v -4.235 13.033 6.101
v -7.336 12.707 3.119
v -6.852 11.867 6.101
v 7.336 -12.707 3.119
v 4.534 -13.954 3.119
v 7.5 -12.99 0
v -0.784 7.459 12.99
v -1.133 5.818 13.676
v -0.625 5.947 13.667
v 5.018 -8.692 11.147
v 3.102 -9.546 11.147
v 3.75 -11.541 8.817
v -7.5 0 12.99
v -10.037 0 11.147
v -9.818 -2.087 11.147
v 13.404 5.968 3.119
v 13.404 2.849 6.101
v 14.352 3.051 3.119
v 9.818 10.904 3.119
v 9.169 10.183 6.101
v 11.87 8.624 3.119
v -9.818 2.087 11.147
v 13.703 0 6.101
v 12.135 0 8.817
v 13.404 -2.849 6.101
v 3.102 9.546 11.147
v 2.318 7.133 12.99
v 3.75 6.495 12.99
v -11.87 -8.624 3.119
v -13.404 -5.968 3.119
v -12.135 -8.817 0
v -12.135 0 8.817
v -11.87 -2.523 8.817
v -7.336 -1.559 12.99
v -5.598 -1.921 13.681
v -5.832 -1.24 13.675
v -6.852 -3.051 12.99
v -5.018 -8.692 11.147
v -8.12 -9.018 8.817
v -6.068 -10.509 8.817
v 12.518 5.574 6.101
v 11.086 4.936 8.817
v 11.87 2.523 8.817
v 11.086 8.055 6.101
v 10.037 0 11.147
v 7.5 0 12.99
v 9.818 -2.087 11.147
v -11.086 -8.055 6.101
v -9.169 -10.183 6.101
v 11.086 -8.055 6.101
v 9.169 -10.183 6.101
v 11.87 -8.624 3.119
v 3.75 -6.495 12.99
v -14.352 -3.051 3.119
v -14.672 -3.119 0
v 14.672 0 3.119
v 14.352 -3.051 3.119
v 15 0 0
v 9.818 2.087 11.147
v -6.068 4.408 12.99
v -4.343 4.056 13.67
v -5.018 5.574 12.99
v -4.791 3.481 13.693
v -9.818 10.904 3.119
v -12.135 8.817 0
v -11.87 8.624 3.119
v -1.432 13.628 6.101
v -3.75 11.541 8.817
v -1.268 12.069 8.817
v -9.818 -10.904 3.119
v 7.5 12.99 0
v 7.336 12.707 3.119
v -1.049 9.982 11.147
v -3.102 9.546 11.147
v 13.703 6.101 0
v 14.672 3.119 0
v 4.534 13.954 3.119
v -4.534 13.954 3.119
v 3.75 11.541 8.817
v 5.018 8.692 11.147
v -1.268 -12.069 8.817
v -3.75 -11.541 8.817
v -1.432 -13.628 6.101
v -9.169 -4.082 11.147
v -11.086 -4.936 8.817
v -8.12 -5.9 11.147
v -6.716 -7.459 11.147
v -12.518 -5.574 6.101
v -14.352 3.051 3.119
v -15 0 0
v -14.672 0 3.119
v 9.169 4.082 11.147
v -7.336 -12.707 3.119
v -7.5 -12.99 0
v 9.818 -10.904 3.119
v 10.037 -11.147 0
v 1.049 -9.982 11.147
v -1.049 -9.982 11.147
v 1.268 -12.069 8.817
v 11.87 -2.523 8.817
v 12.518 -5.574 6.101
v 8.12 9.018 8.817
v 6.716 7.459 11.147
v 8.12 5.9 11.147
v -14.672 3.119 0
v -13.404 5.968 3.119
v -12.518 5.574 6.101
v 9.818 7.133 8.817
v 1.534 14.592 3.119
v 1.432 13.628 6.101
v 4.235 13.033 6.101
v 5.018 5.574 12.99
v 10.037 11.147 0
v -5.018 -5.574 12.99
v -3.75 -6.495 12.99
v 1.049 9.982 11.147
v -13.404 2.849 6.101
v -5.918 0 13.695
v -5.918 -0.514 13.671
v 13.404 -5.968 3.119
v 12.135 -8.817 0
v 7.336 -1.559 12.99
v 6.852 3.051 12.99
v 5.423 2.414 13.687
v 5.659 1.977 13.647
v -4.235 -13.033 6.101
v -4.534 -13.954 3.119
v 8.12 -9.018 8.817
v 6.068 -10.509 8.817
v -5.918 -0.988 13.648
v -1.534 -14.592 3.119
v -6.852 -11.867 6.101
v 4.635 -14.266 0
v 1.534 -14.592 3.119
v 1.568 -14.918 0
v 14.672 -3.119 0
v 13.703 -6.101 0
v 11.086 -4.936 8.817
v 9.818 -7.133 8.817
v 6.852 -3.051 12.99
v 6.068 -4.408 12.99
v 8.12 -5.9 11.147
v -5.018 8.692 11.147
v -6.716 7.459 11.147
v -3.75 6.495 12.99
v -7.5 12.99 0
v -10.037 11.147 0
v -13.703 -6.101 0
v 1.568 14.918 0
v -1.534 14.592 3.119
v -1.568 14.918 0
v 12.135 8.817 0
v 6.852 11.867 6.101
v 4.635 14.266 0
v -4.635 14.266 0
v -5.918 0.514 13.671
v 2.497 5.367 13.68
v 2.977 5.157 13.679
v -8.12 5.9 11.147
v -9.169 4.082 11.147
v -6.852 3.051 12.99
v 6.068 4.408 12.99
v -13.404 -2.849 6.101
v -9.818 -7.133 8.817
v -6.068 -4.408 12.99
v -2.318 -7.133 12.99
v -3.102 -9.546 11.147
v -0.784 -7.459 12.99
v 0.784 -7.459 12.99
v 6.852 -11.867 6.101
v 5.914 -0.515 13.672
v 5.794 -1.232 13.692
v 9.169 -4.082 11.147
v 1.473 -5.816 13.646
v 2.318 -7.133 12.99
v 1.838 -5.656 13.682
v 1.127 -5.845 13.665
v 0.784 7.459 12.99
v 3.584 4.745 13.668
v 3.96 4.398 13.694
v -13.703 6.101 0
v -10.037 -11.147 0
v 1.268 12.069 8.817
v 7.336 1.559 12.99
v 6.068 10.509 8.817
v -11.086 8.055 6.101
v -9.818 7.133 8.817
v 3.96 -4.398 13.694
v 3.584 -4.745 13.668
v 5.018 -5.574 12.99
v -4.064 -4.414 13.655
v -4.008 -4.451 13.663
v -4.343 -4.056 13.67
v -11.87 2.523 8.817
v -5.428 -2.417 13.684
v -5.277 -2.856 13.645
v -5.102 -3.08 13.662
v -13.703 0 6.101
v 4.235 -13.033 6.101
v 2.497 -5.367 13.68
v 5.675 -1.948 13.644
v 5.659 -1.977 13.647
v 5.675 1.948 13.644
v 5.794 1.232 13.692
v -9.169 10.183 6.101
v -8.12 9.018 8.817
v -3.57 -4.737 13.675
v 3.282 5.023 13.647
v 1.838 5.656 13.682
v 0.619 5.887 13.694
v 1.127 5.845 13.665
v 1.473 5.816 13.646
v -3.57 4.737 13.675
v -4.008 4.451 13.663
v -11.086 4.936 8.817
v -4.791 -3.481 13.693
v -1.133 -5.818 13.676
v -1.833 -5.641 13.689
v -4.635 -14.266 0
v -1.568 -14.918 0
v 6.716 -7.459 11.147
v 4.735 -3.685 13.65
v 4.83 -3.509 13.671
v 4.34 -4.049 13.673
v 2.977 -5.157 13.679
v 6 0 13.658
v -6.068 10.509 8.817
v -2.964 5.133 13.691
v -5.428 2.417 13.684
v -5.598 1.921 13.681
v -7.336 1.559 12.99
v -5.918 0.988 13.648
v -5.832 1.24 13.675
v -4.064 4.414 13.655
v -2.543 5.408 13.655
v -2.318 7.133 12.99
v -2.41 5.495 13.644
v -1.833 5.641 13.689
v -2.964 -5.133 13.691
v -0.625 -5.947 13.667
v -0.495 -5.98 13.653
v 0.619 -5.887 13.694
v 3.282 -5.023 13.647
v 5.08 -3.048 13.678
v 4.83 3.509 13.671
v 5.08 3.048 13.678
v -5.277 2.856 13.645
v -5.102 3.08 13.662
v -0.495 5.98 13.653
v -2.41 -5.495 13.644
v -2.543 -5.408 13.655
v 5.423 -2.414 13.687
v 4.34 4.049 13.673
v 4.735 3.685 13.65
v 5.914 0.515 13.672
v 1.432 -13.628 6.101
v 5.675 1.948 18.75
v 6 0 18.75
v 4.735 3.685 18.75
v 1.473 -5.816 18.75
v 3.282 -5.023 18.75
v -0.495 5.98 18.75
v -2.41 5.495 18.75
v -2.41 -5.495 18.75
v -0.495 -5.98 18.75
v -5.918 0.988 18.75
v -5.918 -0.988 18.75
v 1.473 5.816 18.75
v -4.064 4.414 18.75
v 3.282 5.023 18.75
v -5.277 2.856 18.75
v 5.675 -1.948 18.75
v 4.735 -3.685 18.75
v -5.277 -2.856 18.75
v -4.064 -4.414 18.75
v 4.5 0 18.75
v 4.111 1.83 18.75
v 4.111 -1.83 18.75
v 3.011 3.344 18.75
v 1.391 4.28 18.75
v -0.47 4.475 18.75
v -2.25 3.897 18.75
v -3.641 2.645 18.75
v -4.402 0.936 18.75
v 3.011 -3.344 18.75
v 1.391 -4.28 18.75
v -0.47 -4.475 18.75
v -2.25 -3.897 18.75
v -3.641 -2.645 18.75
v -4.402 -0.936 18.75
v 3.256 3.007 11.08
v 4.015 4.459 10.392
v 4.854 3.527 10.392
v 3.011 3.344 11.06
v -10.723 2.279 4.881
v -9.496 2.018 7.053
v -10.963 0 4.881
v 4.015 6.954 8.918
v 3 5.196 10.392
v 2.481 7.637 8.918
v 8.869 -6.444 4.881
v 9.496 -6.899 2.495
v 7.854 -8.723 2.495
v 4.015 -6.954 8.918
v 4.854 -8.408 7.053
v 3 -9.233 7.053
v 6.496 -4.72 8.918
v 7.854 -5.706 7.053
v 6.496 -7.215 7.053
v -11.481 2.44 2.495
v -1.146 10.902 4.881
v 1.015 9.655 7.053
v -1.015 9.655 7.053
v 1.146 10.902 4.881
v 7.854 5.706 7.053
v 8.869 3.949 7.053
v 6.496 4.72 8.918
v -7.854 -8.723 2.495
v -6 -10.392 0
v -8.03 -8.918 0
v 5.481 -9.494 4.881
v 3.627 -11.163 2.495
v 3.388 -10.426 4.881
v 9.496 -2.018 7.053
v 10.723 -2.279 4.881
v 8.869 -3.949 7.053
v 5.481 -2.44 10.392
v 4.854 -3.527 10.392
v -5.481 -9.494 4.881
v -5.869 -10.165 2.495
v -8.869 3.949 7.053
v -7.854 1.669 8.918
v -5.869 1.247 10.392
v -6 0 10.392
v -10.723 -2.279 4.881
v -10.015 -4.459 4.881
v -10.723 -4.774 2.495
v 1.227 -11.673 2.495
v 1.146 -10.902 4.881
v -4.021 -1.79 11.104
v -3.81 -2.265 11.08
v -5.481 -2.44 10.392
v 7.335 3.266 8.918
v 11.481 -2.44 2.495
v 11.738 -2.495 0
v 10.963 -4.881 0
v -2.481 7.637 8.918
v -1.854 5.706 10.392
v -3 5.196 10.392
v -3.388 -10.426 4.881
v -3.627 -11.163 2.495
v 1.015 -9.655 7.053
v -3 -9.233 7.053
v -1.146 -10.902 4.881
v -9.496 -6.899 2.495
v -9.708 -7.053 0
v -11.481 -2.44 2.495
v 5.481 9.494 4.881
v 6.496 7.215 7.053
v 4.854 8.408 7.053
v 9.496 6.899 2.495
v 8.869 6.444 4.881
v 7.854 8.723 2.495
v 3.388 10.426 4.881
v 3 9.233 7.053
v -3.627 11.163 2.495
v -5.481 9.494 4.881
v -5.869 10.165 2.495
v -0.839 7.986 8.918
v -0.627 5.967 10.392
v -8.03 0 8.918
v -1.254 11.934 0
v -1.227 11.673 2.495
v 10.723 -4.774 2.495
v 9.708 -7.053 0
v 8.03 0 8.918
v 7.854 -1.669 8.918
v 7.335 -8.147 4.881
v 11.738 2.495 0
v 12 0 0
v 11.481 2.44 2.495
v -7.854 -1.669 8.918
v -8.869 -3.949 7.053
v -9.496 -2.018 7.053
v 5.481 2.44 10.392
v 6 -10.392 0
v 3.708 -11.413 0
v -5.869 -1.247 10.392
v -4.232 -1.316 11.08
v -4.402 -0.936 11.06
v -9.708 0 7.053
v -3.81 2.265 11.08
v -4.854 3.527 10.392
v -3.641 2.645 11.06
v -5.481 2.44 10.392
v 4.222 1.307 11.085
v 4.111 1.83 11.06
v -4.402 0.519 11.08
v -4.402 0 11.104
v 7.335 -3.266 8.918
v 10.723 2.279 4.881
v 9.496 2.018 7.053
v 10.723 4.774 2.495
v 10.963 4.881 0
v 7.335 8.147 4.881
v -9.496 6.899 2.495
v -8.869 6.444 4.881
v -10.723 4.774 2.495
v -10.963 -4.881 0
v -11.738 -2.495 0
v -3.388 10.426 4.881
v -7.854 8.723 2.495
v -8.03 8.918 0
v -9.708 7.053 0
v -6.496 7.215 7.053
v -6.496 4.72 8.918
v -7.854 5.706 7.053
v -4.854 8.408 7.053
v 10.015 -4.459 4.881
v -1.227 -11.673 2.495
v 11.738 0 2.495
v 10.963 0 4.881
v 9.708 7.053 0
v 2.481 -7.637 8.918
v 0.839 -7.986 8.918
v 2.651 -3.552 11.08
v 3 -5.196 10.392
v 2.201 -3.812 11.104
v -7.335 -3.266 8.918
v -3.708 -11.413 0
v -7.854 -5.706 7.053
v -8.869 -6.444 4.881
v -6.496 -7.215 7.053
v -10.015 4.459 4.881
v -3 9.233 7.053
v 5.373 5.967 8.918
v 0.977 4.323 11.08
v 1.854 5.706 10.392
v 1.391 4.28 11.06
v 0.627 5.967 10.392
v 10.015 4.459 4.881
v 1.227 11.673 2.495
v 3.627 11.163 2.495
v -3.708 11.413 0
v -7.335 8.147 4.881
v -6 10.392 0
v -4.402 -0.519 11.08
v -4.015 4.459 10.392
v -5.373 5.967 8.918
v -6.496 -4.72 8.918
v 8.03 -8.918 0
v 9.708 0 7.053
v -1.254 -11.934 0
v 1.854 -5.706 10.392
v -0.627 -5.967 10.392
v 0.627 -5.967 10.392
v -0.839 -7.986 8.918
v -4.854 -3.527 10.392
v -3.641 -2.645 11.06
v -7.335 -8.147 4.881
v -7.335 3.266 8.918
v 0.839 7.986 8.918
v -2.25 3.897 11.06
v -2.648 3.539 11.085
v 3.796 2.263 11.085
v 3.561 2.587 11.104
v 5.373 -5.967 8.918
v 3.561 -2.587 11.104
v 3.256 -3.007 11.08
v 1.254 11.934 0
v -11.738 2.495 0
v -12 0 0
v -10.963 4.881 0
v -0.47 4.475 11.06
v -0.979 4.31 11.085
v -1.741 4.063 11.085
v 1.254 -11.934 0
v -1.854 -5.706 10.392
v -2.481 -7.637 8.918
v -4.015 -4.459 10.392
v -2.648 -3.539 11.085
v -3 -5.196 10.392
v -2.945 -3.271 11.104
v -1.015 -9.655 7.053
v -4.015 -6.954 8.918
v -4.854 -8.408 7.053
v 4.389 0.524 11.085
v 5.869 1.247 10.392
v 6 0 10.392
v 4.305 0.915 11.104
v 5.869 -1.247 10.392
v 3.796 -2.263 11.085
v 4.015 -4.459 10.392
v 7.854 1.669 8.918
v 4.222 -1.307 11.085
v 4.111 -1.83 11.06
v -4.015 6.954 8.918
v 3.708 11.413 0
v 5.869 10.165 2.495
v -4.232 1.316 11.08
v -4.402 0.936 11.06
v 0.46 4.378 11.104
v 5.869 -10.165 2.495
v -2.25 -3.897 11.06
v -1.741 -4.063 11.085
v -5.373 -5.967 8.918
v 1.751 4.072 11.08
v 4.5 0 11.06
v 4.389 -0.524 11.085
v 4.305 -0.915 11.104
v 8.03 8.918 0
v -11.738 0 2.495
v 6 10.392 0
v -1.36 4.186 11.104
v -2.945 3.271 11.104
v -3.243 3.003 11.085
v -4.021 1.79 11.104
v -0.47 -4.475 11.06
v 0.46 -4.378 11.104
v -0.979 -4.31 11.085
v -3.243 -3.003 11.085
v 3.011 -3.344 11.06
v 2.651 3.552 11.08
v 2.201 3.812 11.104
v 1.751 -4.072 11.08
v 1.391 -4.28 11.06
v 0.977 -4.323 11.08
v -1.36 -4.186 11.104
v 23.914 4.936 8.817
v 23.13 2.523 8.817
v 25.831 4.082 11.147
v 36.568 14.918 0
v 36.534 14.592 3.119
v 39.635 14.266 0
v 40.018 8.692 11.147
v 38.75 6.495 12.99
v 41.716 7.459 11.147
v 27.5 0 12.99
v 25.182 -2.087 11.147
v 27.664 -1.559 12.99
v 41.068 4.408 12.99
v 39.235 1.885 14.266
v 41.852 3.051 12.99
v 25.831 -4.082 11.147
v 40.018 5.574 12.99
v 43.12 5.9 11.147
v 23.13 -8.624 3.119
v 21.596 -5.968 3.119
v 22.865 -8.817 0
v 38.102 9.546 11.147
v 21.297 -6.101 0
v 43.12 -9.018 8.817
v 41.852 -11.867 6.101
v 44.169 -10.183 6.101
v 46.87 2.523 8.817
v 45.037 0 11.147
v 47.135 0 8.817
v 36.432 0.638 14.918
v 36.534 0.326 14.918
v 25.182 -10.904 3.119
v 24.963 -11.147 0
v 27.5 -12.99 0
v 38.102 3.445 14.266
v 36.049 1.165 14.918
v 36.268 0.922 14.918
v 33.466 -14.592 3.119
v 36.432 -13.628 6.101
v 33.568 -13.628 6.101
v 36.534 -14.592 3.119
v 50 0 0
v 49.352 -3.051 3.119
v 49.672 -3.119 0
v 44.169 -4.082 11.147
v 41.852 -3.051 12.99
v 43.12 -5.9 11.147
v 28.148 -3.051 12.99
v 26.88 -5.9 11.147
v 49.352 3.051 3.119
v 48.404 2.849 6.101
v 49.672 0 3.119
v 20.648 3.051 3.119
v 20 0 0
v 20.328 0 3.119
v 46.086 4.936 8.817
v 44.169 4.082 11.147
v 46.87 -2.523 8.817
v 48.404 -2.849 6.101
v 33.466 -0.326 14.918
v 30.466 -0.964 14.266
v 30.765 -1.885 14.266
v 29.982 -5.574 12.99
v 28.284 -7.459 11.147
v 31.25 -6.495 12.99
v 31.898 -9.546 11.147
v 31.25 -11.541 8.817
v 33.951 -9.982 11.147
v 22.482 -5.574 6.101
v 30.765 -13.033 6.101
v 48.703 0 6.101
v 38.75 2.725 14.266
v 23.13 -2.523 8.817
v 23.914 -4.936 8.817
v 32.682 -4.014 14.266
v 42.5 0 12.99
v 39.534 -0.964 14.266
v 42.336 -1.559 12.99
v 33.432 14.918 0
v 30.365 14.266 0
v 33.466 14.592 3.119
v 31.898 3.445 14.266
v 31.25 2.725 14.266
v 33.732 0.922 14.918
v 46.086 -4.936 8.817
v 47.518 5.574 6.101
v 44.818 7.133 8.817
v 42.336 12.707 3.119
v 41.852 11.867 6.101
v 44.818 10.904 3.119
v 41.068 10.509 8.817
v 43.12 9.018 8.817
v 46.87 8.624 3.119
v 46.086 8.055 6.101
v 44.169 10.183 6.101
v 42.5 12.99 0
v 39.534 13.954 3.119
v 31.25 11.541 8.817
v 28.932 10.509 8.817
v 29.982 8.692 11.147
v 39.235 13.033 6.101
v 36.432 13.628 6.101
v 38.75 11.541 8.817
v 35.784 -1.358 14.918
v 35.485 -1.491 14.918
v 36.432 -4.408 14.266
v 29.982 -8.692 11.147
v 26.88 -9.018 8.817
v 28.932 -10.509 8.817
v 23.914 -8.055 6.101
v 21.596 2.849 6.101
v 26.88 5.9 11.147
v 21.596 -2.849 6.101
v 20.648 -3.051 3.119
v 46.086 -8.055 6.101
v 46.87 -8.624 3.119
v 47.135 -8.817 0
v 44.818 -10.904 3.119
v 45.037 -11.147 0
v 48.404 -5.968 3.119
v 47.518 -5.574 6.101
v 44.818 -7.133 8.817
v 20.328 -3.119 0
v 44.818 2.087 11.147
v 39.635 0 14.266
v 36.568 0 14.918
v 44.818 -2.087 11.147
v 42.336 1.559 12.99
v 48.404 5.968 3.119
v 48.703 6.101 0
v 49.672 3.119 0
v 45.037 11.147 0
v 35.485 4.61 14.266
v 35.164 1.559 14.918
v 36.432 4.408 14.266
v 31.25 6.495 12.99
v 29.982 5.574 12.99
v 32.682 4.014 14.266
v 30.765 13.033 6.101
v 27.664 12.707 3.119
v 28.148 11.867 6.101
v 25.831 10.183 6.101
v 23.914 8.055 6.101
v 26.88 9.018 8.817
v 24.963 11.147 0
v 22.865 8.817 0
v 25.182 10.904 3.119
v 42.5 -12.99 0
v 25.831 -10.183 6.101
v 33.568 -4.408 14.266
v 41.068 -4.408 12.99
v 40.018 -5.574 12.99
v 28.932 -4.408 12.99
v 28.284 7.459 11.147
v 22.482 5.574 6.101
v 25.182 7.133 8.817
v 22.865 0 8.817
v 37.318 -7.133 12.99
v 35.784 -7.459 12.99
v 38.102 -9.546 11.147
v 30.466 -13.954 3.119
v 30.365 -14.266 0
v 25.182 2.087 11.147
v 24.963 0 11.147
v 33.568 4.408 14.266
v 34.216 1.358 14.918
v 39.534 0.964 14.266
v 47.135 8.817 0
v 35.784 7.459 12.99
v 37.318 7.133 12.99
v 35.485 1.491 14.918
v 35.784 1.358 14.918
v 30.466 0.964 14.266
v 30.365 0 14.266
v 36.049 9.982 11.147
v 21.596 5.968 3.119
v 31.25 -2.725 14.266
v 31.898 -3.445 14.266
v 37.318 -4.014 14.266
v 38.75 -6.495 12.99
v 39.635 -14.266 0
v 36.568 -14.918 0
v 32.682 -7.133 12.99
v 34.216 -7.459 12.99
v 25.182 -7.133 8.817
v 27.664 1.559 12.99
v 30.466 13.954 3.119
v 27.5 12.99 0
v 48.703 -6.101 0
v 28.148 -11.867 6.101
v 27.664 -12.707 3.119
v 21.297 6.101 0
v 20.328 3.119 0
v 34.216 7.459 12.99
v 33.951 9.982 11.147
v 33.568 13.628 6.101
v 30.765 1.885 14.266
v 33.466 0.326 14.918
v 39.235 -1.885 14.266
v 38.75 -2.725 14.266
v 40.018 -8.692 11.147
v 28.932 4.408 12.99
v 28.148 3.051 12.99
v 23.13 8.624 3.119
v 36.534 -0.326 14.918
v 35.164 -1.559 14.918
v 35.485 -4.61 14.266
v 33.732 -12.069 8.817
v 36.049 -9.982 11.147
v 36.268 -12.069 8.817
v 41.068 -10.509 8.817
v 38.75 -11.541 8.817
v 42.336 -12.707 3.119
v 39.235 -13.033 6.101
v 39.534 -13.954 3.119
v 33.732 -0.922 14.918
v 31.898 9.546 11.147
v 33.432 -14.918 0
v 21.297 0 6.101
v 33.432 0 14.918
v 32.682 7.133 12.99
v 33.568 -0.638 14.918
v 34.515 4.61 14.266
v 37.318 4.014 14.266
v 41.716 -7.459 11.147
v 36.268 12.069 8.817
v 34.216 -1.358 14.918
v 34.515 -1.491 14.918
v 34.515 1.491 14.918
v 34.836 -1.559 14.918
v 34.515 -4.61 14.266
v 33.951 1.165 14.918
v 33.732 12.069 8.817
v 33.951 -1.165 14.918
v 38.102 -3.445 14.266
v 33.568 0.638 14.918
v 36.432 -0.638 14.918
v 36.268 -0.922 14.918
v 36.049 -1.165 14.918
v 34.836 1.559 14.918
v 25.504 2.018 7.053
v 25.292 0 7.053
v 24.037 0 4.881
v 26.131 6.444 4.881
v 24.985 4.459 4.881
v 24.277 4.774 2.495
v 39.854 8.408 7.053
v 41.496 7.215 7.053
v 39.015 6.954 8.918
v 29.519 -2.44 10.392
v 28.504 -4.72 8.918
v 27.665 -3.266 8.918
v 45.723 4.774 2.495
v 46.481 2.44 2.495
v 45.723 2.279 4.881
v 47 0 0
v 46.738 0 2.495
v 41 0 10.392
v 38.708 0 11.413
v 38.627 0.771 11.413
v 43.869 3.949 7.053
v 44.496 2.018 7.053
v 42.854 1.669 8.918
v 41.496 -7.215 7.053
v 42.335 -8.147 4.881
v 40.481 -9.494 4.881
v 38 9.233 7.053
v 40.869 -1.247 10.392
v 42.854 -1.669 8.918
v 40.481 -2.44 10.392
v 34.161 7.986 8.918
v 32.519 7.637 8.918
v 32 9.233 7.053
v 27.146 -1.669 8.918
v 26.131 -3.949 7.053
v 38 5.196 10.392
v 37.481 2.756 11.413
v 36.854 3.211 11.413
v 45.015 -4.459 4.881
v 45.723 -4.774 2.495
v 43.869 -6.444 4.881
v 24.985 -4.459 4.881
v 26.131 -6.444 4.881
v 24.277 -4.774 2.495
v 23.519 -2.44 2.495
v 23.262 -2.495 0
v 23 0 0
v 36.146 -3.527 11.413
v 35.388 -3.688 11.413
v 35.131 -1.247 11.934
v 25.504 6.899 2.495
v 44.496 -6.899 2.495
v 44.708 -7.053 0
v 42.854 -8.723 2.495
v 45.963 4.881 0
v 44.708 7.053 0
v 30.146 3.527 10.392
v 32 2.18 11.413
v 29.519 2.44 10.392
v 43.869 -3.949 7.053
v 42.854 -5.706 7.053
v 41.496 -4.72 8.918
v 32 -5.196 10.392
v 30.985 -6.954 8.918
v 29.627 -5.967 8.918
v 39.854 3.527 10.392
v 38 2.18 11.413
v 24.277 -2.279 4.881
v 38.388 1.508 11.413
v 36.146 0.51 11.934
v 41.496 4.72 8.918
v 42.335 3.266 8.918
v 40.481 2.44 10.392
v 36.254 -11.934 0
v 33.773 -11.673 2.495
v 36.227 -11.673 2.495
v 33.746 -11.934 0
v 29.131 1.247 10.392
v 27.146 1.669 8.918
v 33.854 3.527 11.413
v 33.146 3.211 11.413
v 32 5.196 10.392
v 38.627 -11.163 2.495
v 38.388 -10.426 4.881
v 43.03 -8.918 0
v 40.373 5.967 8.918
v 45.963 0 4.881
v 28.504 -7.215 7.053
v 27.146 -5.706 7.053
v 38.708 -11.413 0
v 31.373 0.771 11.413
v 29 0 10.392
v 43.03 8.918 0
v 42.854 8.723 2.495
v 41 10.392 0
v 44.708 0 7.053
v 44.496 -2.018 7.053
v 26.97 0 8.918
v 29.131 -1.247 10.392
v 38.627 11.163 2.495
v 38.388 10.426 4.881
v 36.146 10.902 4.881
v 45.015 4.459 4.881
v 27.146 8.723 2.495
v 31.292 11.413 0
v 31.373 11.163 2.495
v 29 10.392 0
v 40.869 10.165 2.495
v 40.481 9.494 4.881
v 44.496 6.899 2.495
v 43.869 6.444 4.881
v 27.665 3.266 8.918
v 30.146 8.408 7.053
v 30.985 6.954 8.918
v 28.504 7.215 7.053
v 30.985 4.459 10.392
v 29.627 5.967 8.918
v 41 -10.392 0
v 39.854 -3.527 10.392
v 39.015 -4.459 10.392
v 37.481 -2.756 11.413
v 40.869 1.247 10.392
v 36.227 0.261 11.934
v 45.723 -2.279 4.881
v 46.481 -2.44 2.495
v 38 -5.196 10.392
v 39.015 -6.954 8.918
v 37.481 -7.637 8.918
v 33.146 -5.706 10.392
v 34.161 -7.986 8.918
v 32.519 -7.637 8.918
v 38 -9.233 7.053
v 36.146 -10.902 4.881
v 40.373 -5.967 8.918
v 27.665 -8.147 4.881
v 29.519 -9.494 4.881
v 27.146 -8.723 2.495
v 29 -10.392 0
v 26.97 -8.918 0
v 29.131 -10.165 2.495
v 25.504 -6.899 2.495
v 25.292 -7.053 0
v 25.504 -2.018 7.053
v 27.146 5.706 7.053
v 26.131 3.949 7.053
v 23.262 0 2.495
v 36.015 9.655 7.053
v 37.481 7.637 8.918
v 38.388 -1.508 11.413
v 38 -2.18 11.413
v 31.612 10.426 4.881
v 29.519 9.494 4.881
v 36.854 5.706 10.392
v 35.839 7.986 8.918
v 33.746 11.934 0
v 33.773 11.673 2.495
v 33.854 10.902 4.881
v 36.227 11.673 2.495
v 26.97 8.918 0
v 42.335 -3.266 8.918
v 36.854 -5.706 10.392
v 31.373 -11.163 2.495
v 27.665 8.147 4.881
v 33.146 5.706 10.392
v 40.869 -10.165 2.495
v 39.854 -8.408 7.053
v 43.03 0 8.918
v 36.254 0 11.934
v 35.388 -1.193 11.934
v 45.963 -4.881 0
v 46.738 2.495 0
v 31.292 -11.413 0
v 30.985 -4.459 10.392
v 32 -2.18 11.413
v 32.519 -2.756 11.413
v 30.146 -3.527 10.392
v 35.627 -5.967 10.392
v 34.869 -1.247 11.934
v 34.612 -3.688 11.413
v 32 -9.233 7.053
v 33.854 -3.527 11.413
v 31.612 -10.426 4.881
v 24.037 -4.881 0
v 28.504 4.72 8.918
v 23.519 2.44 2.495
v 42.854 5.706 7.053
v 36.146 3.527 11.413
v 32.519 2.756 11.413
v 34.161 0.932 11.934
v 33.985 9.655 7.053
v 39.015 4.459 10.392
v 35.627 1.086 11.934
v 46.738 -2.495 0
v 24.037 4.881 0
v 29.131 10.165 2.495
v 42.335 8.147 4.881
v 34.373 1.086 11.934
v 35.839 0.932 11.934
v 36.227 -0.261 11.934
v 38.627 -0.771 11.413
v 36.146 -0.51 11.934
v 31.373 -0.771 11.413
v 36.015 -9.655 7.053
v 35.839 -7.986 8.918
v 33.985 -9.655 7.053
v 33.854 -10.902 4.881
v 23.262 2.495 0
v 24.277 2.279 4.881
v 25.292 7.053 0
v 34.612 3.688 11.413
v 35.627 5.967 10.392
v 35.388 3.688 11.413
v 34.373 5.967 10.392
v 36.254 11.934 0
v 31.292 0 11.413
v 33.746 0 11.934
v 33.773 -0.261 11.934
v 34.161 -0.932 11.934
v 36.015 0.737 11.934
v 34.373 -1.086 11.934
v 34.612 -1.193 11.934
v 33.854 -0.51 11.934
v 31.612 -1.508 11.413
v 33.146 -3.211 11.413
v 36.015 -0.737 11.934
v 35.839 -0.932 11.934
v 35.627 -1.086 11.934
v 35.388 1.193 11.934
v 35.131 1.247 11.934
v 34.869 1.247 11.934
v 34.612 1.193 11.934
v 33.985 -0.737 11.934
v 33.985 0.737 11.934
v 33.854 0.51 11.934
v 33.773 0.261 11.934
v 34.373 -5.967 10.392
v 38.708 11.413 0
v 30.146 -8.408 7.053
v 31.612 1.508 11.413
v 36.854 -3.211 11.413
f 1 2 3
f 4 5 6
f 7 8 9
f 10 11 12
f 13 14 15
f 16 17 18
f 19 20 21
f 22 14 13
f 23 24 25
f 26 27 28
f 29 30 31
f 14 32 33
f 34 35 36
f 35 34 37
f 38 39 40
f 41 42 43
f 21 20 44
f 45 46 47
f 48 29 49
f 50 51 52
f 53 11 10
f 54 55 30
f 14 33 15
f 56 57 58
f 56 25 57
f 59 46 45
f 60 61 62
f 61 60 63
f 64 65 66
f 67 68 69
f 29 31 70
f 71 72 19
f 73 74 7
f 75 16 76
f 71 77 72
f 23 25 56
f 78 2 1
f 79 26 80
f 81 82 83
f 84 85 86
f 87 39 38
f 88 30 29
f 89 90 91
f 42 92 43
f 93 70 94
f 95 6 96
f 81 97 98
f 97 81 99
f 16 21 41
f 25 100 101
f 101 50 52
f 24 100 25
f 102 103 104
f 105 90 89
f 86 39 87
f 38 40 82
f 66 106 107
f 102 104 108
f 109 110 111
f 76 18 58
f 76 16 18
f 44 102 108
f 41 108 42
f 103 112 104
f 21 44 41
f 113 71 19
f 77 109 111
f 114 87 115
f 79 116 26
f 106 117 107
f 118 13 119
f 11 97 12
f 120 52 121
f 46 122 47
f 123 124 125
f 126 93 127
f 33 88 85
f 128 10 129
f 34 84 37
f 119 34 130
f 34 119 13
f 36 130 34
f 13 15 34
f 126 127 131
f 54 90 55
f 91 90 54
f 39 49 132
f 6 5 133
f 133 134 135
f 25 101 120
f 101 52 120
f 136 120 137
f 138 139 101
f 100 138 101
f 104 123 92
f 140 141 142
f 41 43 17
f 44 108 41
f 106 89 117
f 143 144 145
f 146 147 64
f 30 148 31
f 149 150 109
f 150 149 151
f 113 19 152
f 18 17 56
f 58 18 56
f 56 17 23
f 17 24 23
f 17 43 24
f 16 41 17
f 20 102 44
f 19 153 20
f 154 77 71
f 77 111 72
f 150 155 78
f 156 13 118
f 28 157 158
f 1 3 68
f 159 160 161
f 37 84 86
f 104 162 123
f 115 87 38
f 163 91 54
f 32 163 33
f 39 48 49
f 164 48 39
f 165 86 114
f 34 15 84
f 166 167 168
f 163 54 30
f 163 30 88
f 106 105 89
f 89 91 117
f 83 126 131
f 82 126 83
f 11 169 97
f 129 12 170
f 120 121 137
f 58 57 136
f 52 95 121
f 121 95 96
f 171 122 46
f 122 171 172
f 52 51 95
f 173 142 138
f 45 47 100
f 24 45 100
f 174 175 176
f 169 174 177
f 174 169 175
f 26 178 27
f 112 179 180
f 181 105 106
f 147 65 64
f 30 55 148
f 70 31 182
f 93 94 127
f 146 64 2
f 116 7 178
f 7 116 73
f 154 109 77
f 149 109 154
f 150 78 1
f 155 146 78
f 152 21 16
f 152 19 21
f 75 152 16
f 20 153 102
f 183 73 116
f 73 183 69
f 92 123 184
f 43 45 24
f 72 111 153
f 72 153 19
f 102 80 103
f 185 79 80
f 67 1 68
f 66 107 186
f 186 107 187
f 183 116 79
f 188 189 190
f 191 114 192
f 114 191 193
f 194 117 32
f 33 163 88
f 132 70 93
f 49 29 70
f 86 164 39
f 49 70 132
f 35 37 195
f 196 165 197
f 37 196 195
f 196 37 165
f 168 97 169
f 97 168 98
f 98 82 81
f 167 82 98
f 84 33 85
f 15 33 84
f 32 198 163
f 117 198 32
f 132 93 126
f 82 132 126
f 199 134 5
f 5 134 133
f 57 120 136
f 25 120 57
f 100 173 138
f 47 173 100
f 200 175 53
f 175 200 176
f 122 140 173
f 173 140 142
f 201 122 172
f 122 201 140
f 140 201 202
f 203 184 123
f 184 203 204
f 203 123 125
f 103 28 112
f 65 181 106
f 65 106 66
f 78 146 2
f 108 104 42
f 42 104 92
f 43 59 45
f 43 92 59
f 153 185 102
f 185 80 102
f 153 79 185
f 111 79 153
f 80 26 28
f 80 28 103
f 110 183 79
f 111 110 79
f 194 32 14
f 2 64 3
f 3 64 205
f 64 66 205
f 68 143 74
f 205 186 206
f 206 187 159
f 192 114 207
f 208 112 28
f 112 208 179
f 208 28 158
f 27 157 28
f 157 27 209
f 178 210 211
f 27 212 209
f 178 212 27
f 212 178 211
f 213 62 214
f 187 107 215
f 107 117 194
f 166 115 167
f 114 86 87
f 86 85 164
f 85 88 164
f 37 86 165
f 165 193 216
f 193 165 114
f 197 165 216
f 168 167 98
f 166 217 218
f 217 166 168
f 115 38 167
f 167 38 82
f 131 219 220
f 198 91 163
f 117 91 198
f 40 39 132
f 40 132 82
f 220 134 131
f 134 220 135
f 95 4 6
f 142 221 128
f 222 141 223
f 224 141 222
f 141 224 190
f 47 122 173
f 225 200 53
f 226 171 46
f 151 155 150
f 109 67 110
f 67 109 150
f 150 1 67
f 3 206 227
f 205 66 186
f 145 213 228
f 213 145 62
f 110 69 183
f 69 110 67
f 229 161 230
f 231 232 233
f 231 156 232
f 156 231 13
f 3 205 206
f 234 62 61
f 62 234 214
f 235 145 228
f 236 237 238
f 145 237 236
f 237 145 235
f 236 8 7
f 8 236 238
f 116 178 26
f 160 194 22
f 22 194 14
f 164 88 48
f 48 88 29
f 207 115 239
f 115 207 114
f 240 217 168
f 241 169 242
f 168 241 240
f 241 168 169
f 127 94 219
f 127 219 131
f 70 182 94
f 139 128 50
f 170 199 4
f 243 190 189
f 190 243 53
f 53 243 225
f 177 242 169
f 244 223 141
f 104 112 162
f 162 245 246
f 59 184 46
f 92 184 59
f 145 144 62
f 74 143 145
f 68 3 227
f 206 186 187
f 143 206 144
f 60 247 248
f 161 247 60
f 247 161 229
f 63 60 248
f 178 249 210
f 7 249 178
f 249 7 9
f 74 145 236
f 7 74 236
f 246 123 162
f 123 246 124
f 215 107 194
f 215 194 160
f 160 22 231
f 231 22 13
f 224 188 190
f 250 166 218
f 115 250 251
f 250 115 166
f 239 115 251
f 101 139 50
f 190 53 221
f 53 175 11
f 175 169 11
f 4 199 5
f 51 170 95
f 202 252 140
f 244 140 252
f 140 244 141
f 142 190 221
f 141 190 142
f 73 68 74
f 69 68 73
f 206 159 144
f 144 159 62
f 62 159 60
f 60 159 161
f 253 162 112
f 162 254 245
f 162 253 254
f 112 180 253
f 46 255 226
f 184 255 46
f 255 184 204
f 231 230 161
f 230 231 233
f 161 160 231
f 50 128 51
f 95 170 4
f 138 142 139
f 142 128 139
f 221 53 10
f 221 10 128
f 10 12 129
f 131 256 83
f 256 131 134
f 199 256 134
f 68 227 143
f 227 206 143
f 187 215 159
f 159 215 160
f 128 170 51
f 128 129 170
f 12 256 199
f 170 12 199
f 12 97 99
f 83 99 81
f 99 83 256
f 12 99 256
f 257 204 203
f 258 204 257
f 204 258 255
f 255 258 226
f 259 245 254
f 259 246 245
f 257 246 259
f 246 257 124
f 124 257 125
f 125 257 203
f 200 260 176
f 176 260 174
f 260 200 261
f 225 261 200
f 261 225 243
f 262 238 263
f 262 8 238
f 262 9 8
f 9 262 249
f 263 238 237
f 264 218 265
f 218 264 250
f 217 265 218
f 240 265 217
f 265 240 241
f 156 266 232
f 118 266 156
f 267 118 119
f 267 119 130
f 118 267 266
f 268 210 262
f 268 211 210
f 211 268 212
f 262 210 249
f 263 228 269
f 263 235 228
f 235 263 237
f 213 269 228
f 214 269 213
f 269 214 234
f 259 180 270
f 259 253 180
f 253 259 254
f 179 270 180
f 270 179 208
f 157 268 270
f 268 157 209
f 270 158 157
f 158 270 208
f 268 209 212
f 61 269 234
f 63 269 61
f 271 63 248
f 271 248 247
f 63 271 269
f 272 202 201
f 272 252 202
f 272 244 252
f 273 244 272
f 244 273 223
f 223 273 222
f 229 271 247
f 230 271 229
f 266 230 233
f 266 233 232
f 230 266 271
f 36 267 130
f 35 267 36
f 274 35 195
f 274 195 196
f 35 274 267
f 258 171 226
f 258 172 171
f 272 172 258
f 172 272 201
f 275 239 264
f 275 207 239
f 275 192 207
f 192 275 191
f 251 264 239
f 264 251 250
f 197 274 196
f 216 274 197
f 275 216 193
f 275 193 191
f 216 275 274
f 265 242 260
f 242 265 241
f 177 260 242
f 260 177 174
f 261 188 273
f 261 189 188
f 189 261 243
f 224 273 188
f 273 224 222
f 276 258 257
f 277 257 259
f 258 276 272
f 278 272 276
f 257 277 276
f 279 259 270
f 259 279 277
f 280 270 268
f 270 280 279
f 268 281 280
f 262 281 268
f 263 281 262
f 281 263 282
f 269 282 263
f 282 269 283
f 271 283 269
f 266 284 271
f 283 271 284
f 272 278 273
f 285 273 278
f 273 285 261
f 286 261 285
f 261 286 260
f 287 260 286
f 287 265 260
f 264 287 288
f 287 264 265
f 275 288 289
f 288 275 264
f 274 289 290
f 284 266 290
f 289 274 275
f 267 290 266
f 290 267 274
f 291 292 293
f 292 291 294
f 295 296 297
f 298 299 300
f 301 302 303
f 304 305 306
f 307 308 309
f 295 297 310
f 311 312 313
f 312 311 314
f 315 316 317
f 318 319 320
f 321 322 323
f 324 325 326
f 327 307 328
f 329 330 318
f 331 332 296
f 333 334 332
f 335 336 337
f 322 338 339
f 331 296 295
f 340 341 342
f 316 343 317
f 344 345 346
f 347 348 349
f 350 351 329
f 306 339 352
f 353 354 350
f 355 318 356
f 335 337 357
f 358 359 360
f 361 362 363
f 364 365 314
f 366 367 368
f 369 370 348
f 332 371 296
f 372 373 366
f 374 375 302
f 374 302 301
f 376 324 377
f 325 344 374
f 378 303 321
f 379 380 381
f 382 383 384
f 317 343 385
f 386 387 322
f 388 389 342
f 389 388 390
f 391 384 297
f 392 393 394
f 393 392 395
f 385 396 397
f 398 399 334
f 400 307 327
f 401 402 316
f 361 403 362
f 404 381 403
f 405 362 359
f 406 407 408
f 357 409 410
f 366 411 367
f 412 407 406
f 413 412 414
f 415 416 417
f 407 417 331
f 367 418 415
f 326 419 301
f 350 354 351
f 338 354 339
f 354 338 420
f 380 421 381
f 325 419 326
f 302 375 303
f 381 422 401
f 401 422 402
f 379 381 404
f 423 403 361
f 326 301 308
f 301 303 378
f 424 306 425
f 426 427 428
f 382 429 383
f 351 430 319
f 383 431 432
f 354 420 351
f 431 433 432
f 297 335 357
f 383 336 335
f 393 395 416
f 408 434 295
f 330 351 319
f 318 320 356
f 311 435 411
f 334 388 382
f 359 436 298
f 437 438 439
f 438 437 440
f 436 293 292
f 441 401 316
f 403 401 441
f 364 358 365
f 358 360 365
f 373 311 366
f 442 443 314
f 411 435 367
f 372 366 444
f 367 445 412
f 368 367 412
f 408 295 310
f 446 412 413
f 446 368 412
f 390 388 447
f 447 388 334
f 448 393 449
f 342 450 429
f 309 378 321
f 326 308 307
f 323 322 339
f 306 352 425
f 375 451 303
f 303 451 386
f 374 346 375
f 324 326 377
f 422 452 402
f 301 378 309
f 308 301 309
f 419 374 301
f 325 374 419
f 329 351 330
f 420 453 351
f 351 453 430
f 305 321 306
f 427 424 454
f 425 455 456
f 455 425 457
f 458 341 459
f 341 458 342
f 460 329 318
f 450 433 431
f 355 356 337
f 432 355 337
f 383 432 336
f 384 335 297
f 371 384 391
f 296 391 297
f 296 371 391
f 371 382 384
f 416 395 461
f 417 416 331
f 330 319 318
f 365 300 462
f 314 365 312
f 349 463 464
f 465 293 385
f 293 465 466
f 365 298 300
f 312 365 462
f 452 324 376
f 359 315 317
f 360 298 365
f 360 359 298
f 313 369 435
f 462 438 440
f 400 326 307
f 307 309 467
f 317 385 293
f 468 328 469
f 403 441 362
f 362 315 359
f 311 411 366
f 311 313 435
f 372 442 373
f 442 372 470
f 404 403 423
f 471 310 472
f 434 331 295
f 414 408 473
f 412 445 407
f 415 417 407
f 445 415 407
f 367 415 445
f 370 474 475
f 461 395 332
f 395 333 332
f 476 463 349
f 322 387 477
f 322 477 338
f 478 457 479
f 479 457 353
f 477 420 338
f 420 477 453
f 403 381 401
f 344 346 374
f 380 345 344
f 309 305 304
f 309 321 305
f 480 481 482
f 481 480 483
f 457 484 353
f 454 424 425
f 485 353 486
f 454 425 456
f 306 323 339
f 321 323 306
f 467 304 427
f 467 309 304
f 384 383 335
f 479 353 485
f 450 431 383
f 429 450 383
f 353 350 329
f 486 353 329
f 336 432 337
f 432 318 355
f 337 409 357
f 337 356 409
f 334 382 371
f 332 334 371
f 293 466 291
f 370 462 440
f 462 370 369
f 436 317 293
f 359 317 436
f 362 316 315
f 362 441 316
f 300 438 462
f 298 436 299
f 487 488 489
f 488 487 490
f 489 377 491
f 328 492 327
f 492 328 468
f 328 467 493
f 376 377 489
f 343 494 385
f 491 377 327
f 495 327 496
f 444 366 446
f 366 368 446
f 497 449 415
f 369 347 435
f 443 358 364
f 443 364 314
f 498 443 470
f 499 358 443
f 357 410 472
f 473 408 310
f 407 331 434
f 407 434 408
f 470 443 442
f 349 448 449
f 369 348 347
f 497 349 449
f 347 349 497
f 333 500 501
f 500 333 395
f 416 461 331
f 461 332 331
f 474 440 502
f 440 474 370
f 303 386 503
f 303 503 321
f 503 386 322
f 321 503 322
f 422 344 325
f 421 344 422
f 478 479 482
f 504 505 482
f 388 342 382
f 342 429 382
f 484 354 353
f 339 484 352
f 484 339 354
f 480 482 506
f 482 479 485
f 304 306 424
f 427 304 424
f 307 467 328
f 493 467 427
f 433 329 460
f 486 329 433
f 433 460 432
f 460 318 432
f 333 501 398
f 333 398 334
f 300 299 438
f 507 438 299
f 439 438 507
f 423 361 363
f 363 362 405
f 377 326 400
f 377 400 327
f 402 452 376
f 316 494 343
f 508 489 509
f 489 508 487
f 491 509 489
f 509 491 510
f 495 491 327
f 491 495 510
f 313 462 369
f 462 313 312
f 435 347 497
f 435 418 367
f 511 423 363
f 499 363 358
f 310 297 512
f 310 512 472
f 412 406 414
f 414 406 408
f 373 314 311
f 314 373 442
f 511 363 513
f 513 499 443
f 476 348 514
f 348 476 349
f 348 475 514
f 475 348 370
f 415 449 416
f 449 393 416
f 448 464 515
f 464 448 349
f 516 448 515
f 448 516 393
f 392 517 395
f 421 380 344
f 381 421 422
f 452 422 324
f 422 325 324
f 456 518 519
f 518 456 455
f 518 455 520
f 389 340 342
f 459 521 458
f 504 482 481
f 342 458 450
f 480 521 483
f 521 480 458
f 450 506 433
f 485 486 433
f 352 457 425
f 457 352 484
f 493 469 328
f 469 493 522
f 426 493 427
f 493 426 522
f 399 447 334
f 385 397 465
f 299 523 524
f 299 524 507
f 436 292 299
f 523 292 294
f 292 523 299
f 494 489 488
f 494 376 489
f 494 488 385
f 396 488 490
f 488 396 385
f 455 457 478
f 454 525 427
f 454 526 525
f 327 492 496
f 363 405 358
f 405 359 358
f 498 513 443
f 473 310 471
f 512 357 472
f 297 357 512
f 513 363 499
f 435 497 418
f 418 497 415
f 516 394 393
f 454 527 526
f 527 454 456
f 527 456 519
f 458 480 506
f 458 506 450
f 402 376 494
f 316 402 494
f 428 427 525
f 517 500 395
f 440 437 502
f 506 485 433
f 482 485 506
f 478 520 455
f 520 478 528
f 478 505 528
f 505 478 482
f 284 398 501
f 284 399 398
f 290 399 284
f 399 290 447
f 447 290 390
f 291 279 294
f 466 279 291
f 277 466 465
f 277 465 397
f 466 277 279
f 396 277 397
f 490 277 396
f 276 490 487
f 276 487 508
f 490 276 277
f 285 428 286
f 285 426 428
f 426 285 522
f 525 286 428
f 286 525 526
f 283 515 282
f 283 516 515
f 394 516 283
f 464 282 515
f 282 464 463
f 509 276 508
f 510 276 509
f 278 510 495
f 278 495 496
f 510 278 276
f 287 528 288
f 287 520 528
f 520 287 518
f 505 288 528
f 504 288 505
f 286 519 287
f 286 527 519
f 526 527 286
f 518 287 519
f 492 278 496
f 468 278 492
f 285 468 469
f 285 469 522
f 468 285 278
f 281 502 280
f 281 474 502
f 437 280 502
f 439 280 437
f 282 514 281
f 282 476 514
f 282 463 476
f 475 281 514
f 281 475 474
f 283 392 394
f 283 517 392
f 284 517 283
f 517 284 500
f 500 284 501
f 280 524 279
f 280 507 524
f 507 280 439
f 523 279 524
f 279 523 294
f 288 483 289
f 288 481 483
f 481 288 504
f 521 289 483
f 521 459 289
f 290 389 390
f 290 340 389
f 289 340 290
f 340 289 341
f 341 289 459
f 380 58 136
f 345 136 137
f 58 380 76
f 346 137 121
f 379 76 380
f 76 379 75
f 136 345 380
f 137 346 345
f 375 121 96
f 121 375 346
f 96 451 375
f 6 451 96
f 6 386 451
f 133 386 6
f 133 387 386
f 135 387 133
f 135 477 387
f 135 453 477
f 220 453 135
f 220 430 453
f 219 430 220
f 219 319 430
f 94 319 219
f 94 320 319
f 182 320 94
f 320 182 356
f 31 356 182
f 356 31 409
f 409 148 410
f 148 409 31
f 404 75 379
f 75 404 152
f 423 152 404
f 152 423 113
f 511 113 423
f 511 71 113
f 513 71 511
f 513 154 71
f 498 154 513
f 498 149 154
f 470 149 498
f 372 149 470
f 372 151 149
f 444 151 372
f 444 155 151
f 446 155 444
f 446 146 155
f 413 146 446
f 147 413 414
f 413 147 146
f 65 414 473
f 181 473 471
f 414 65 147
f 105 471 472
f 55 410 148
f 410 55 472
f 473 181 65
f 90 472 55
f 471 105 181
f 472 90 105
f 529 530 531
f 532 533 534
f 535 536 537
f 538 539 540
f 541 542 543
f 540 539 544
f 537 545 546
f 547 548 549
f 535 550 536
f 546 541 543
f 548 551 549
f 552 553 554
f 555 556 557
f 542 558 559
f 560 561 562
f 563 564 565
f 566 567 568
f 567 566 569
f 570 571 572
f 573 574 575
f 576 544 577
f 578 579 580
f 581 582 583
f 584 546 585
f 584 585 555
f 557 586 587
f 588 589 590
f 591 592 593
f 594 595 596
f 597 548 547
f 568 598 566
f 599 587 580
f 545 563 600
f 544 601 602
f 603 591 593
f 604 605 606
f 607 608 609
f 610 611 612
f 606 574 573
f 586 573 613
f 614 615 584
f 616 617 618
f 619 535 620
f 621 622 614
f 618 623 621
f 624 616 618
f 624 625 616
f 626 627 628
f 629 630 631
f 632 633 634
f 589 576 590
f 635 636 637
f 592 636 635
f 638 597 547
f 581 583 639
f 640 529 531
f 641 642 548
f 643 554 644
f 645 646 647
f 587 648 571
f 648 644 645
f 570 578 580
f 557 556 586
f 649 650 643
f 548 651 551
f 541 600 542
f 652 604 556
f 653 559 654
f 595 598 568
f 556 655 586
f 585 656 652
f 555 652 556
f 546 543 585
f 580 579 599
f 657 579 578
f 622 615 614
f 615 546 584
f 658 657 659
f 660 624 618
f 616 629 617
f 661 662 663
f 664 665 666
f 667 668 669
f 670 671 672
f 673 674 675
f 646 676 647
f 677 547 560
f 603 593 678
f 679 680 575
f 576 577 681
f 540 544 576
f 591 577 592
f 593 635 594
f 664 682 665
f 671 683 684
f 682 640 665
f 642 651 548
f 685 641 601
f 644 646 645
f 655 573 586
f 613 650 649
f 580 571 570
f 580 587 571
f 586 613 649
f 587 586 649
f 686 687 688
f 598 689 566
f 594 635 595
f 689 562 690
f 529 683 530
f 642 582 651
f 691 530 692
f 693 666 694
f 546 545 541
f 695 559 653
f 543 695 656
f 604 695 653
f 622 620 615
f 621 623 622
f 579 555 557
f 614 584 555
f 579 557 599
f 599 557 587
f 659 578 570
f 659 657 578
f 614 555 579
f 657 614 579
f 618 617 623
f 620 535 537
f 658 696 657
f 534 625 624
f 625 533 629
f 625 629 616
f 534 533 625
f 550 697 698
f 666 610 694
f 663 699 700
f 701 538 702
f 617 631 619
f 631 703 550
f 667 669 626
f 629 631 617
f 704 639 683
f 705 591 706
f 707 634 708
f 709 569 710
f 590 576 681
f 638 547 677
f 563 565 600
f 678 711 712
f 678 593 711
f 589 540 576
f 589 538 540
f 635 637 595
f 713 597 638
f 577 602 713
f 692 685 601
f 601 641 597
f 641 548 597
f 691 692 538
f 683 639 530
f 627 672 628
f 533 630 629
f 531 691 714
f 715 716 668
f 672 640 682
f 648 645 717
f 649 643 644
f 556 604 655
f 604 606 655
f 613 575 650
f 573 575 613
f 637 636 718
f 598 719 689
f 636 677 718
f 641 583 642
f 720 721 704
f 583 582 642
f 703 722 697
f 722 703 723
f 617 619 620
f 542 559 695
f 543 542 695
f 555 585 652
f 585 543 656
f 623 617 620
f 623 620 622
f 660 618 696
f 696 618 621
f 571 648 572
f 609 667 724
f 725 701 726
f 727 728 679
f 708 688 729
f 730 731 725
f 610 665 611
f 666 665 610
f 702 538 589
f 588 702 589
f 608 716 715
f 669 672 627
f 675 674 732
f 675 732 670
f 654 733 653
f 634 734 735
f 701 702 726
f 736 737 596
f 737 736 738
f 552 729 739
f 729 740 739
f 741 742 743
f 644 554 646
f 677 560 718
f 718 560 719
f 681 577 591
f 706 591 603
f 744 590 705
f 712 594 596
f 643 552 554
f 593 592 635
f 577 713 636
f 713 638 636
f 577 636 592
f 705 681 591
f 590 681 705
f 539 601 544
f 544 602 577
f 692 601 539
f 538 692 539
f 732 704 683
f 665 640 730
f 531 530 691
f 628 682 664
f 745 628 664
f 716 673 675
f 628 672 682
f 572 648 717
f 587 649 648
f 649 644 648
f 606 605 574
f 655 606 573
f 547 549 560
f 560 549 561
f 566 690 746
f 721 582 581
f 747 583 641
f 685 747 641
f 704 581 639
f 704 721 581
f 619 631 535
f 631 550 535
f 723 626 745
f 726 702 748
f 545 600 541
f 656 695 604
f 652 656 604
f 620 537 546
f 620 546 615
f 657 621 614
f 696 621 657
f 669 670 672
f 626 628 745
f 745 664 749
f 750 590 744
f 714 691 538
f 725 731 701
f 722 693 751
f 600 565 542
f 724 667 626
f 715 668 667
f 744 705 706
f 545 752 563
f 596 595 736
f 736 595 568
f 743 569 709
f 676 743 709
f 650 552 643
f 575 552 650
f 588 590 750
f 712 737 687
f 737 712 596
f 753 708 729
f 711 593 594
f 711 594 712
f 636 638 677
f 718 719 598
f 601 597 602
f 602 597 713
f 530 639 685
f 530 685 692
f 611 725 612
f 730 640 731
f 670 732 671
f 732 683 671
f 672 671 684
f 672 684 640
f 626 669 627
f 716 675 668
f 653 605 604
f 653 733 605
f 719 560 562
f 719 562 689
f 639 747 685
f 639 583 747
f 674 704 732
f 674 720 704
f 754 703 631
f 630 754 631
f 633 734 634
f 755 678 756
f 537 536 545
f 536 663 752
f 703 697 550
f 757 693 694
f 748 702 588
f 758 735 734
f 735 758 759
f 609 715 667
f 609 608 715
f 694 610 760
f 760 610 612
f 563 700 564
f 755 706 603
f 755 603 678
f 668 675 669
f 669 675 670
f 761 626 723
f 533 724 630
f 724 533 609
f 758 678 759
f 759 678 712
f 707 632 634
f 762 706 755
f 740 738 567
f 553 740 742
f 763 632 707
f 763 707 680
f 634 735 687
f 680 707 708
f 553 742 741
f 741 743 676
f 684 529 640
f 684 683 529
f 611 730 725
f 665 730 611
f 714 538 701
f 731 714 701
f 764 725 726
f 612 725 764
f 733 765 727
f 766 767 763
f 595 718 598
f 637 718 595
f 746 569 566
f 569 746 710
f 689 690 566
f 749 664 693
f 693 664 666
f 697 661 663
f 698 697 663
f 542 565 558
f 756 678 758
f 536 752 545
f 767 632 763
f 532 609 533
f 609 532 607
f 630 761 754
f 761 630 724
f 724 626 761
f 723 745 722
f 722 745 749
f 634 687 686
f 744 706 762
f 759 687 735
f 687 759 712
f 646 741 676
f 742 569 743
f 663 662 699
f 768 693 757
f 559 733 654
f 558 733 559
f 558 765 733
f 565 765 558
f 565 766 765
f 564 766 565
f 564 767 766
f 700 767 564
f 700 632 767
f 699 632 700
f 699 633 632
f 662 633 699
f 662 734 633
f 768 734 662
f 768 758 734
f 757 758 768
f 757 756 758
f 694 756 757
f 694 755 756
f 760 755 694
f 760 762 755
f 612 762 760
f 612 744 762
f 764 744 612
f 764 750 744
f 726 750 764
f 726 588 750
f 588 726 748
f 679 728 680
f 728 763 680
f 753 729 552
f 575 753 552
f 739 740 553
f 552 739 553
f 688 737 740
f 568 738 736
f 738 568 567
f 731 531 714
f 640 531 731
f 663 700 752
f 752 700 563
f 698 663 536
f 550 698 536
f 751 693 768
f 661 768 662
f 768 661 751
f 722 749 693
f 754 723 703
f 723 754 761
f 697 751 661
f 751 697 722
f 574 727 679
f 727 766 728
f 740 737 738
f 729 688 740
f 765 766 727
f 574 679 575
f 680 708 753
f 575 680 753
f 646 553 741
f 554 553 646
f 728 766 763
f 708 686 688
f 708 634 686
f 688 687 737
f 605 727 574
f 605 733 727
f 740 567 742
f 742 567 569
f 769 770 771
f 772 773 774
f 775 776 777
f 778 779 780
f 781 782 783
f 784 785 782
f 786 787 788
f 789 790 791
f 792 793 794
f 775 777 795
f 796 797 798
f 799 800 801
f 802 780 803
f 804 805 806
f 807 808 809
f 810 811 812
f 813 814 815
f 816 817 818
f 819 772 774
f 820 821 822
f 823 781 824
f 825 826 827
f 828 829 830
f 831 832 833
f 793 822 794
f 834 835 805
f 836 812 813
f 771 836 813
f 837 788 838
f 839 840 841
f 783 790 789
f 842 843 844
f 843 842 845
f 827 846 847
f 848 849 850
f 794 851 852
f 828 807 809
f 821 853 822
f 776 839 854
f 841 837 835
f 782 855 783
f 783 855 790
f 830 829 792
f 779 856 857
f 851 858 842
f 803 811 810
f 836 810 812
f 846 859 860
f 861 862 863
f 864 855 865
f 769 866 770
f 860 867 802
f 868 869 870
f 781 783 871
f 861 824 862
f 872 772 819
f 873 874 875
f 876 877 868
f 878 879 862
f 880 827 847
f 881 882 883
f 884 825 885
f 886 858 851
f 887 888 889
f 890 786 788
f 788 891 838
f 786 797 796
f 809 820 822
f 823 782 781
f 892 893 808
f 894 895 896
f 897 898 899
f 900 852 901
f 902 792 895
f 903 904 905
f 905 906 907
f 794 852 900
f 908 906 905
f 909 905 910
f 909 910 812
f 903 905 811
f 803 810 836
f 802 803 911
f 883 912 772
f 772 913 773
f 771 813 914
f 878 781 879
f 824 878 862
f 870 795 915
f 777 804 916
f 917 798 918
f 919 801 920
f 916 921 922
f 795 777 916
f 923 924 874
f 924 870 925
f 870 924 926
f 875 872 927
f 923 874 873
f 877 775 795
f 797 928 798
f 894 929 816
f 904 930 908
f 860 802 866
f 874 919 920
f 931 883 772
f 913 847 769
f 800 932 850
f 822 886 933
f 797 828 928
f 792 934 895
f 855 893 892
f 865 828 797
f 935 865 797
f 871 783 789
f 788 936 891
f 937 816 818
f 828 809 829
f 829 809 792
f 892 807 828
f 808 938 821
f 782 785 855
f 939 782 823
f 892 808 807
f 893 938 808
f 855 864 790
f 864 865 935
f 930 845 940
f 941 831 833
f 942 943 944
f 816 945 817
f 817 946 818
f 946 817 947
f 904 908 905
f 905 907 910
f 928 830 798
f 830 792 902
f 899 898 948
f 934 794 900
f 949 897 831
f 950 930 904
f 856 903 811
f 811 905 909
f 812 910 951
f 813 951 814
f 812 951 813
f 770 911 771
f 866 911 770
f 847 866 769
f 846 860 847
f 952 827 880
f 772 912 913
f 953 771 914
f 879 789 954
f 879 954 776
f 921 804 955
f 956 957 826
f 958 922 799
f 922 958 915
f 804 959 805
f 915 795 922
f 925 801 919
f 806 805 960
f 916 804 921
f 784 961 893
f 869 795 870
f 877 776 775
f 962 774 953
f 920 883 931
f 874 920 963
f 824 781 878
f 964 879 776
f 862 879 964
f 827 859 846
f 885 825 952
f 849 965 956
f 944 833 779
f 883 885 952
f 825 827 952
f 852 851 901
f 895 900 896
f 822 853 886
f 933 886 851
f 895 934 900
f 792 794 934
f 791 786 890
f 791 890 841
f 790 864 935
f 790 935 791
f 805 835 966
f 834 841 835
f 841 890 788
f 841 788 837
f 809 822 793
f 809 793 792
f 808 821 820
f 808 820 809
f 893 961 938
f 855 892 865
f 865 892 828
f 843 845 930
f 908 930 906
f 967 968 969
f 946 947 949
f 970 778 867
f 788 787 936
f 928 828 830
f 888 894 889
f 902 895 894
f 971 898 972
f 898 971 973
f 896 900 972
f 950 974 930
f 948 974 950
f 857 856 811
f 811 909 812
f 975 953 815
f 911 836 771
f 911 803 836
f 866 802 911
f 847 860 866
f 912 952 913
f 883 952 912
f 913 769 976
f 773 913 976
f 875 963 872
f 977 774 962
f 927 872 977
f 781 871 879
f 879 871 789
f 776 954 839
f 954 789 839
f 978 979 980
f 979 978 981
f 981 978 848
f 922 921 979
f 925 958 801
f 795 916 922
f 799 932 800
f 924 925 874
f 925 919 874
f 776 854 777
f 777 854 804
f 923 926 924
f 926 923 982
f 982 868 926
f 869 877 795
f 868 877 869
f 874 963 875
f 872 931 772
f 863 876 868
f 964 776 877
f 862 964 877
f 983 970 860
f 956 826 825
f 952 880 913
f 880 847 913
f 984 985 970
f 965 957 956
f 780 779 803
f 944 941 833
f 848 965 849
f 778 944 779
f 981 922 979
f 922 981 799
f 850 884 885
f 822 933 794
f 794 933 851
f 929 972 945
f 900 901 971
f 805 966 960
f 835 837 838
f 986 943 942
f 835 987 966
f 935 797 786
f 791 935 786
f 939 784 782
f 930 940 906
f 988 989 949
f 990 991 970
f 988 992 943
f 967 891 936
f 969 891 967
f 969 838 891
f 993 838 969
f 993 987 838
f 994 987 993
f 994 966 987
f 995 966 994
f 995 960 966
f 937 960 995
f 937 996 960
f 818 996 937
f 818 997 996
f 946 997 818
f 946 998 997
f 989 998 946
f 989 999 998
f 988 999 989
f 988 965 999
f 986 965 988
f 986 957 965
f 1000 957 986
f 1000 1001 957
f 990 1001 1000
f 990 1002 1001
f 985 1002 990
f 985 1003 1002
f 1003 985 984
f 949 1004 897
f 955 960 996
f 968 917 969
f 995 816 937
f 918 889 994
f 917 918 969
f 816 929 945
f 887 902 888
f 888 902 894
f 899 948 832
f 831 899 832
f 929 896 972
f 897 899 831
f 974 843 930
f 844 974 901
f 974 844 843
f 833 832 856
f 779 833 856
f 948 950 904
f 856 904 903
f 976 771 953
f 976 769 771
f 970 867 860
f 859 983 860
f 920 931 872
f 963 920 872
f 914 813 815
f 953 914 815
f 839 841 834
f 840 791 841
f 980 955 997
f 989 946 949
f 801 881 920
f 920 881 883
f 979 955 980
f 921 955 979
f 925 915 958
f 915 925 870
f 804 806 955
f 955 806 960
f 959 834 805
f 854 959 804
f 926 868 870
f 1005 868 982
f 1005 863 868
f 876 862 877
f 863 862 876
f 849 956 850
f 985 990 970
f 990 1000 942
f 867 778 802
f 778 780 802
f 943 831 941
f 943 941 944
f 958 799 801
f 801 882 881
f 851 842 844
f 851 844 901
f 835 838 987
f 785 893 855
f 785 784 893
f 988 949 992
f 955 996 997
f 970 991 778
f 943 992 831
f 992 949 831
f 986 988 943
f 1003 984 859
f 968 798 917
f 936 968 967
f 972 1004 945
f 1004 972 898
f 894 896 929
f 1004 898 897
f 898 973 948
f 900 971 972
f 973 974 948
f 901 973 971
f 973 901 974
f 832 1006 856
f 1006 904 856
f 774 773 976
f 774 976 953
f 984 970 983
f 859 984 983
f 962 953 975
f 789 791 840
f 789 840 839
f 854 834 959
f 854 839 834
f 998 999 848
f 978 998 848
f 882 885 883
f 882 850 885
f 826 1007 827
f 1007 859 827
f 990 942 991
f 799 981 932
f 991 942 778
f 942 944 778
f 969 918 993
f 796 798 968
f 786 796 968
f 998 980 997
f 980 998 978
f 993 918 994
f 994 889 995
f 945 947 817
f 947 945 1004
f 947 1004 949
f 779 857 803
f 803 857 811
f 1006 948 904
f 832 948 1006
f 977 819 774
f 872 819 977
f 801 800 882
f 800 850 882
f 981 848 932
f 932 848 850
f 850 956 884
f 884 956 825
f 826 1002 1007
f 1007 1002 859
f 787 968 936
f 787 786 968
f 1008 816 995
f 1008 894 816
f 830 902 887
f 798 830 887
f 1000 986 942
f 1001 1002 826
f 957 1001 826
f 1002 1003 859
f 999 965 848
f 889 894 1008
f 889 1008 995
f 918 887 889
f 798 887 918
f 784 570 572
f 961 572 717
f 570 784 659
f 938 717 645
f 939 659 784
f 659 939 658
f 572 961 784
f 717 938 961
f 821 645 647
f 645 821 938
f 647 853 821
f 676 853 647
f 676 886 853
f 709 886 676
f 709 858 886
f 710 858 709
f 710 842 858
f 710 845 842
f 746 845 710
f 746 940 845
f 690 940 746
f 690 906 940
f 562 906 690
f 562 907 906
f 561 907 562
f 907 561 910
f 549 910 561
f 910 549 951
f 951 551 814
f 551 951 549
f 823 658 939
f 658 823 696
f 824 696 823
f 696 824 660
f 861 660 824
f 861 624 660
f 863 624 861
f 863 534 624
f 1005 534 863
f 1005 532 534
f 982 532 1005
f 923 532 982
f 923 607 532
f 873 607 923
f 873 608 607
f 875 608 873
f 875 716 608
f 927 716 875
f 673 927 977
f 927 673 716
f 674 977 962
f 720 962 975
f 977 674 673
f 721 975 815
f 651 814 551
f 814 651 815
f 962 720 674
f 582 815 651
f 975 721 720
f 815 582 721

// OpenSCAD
// radius
rad = 15;
//wall thickness
sp = 3;

dia = rad*2;

difference(){
    union(){
    sphere(rad);
    cylinder(rad*1.25,rad*0.4,rad*0.4);
    }
        sphere(rad-sp);
        cylinder(rad*2*1.25,rad*0.4-sp/2,rad*0.4-sp/2);
        translate ([-dia/2,-dia/2,-dia]) cube([dia,dia,dia]);
}

translate ([dia+5,0,0])
difference(){
    sphere(rad);
        sphere(rad-sp);
        translate ([-dia/2,-dia/2,-dia]) cube([dia,dia,dia]);
}
